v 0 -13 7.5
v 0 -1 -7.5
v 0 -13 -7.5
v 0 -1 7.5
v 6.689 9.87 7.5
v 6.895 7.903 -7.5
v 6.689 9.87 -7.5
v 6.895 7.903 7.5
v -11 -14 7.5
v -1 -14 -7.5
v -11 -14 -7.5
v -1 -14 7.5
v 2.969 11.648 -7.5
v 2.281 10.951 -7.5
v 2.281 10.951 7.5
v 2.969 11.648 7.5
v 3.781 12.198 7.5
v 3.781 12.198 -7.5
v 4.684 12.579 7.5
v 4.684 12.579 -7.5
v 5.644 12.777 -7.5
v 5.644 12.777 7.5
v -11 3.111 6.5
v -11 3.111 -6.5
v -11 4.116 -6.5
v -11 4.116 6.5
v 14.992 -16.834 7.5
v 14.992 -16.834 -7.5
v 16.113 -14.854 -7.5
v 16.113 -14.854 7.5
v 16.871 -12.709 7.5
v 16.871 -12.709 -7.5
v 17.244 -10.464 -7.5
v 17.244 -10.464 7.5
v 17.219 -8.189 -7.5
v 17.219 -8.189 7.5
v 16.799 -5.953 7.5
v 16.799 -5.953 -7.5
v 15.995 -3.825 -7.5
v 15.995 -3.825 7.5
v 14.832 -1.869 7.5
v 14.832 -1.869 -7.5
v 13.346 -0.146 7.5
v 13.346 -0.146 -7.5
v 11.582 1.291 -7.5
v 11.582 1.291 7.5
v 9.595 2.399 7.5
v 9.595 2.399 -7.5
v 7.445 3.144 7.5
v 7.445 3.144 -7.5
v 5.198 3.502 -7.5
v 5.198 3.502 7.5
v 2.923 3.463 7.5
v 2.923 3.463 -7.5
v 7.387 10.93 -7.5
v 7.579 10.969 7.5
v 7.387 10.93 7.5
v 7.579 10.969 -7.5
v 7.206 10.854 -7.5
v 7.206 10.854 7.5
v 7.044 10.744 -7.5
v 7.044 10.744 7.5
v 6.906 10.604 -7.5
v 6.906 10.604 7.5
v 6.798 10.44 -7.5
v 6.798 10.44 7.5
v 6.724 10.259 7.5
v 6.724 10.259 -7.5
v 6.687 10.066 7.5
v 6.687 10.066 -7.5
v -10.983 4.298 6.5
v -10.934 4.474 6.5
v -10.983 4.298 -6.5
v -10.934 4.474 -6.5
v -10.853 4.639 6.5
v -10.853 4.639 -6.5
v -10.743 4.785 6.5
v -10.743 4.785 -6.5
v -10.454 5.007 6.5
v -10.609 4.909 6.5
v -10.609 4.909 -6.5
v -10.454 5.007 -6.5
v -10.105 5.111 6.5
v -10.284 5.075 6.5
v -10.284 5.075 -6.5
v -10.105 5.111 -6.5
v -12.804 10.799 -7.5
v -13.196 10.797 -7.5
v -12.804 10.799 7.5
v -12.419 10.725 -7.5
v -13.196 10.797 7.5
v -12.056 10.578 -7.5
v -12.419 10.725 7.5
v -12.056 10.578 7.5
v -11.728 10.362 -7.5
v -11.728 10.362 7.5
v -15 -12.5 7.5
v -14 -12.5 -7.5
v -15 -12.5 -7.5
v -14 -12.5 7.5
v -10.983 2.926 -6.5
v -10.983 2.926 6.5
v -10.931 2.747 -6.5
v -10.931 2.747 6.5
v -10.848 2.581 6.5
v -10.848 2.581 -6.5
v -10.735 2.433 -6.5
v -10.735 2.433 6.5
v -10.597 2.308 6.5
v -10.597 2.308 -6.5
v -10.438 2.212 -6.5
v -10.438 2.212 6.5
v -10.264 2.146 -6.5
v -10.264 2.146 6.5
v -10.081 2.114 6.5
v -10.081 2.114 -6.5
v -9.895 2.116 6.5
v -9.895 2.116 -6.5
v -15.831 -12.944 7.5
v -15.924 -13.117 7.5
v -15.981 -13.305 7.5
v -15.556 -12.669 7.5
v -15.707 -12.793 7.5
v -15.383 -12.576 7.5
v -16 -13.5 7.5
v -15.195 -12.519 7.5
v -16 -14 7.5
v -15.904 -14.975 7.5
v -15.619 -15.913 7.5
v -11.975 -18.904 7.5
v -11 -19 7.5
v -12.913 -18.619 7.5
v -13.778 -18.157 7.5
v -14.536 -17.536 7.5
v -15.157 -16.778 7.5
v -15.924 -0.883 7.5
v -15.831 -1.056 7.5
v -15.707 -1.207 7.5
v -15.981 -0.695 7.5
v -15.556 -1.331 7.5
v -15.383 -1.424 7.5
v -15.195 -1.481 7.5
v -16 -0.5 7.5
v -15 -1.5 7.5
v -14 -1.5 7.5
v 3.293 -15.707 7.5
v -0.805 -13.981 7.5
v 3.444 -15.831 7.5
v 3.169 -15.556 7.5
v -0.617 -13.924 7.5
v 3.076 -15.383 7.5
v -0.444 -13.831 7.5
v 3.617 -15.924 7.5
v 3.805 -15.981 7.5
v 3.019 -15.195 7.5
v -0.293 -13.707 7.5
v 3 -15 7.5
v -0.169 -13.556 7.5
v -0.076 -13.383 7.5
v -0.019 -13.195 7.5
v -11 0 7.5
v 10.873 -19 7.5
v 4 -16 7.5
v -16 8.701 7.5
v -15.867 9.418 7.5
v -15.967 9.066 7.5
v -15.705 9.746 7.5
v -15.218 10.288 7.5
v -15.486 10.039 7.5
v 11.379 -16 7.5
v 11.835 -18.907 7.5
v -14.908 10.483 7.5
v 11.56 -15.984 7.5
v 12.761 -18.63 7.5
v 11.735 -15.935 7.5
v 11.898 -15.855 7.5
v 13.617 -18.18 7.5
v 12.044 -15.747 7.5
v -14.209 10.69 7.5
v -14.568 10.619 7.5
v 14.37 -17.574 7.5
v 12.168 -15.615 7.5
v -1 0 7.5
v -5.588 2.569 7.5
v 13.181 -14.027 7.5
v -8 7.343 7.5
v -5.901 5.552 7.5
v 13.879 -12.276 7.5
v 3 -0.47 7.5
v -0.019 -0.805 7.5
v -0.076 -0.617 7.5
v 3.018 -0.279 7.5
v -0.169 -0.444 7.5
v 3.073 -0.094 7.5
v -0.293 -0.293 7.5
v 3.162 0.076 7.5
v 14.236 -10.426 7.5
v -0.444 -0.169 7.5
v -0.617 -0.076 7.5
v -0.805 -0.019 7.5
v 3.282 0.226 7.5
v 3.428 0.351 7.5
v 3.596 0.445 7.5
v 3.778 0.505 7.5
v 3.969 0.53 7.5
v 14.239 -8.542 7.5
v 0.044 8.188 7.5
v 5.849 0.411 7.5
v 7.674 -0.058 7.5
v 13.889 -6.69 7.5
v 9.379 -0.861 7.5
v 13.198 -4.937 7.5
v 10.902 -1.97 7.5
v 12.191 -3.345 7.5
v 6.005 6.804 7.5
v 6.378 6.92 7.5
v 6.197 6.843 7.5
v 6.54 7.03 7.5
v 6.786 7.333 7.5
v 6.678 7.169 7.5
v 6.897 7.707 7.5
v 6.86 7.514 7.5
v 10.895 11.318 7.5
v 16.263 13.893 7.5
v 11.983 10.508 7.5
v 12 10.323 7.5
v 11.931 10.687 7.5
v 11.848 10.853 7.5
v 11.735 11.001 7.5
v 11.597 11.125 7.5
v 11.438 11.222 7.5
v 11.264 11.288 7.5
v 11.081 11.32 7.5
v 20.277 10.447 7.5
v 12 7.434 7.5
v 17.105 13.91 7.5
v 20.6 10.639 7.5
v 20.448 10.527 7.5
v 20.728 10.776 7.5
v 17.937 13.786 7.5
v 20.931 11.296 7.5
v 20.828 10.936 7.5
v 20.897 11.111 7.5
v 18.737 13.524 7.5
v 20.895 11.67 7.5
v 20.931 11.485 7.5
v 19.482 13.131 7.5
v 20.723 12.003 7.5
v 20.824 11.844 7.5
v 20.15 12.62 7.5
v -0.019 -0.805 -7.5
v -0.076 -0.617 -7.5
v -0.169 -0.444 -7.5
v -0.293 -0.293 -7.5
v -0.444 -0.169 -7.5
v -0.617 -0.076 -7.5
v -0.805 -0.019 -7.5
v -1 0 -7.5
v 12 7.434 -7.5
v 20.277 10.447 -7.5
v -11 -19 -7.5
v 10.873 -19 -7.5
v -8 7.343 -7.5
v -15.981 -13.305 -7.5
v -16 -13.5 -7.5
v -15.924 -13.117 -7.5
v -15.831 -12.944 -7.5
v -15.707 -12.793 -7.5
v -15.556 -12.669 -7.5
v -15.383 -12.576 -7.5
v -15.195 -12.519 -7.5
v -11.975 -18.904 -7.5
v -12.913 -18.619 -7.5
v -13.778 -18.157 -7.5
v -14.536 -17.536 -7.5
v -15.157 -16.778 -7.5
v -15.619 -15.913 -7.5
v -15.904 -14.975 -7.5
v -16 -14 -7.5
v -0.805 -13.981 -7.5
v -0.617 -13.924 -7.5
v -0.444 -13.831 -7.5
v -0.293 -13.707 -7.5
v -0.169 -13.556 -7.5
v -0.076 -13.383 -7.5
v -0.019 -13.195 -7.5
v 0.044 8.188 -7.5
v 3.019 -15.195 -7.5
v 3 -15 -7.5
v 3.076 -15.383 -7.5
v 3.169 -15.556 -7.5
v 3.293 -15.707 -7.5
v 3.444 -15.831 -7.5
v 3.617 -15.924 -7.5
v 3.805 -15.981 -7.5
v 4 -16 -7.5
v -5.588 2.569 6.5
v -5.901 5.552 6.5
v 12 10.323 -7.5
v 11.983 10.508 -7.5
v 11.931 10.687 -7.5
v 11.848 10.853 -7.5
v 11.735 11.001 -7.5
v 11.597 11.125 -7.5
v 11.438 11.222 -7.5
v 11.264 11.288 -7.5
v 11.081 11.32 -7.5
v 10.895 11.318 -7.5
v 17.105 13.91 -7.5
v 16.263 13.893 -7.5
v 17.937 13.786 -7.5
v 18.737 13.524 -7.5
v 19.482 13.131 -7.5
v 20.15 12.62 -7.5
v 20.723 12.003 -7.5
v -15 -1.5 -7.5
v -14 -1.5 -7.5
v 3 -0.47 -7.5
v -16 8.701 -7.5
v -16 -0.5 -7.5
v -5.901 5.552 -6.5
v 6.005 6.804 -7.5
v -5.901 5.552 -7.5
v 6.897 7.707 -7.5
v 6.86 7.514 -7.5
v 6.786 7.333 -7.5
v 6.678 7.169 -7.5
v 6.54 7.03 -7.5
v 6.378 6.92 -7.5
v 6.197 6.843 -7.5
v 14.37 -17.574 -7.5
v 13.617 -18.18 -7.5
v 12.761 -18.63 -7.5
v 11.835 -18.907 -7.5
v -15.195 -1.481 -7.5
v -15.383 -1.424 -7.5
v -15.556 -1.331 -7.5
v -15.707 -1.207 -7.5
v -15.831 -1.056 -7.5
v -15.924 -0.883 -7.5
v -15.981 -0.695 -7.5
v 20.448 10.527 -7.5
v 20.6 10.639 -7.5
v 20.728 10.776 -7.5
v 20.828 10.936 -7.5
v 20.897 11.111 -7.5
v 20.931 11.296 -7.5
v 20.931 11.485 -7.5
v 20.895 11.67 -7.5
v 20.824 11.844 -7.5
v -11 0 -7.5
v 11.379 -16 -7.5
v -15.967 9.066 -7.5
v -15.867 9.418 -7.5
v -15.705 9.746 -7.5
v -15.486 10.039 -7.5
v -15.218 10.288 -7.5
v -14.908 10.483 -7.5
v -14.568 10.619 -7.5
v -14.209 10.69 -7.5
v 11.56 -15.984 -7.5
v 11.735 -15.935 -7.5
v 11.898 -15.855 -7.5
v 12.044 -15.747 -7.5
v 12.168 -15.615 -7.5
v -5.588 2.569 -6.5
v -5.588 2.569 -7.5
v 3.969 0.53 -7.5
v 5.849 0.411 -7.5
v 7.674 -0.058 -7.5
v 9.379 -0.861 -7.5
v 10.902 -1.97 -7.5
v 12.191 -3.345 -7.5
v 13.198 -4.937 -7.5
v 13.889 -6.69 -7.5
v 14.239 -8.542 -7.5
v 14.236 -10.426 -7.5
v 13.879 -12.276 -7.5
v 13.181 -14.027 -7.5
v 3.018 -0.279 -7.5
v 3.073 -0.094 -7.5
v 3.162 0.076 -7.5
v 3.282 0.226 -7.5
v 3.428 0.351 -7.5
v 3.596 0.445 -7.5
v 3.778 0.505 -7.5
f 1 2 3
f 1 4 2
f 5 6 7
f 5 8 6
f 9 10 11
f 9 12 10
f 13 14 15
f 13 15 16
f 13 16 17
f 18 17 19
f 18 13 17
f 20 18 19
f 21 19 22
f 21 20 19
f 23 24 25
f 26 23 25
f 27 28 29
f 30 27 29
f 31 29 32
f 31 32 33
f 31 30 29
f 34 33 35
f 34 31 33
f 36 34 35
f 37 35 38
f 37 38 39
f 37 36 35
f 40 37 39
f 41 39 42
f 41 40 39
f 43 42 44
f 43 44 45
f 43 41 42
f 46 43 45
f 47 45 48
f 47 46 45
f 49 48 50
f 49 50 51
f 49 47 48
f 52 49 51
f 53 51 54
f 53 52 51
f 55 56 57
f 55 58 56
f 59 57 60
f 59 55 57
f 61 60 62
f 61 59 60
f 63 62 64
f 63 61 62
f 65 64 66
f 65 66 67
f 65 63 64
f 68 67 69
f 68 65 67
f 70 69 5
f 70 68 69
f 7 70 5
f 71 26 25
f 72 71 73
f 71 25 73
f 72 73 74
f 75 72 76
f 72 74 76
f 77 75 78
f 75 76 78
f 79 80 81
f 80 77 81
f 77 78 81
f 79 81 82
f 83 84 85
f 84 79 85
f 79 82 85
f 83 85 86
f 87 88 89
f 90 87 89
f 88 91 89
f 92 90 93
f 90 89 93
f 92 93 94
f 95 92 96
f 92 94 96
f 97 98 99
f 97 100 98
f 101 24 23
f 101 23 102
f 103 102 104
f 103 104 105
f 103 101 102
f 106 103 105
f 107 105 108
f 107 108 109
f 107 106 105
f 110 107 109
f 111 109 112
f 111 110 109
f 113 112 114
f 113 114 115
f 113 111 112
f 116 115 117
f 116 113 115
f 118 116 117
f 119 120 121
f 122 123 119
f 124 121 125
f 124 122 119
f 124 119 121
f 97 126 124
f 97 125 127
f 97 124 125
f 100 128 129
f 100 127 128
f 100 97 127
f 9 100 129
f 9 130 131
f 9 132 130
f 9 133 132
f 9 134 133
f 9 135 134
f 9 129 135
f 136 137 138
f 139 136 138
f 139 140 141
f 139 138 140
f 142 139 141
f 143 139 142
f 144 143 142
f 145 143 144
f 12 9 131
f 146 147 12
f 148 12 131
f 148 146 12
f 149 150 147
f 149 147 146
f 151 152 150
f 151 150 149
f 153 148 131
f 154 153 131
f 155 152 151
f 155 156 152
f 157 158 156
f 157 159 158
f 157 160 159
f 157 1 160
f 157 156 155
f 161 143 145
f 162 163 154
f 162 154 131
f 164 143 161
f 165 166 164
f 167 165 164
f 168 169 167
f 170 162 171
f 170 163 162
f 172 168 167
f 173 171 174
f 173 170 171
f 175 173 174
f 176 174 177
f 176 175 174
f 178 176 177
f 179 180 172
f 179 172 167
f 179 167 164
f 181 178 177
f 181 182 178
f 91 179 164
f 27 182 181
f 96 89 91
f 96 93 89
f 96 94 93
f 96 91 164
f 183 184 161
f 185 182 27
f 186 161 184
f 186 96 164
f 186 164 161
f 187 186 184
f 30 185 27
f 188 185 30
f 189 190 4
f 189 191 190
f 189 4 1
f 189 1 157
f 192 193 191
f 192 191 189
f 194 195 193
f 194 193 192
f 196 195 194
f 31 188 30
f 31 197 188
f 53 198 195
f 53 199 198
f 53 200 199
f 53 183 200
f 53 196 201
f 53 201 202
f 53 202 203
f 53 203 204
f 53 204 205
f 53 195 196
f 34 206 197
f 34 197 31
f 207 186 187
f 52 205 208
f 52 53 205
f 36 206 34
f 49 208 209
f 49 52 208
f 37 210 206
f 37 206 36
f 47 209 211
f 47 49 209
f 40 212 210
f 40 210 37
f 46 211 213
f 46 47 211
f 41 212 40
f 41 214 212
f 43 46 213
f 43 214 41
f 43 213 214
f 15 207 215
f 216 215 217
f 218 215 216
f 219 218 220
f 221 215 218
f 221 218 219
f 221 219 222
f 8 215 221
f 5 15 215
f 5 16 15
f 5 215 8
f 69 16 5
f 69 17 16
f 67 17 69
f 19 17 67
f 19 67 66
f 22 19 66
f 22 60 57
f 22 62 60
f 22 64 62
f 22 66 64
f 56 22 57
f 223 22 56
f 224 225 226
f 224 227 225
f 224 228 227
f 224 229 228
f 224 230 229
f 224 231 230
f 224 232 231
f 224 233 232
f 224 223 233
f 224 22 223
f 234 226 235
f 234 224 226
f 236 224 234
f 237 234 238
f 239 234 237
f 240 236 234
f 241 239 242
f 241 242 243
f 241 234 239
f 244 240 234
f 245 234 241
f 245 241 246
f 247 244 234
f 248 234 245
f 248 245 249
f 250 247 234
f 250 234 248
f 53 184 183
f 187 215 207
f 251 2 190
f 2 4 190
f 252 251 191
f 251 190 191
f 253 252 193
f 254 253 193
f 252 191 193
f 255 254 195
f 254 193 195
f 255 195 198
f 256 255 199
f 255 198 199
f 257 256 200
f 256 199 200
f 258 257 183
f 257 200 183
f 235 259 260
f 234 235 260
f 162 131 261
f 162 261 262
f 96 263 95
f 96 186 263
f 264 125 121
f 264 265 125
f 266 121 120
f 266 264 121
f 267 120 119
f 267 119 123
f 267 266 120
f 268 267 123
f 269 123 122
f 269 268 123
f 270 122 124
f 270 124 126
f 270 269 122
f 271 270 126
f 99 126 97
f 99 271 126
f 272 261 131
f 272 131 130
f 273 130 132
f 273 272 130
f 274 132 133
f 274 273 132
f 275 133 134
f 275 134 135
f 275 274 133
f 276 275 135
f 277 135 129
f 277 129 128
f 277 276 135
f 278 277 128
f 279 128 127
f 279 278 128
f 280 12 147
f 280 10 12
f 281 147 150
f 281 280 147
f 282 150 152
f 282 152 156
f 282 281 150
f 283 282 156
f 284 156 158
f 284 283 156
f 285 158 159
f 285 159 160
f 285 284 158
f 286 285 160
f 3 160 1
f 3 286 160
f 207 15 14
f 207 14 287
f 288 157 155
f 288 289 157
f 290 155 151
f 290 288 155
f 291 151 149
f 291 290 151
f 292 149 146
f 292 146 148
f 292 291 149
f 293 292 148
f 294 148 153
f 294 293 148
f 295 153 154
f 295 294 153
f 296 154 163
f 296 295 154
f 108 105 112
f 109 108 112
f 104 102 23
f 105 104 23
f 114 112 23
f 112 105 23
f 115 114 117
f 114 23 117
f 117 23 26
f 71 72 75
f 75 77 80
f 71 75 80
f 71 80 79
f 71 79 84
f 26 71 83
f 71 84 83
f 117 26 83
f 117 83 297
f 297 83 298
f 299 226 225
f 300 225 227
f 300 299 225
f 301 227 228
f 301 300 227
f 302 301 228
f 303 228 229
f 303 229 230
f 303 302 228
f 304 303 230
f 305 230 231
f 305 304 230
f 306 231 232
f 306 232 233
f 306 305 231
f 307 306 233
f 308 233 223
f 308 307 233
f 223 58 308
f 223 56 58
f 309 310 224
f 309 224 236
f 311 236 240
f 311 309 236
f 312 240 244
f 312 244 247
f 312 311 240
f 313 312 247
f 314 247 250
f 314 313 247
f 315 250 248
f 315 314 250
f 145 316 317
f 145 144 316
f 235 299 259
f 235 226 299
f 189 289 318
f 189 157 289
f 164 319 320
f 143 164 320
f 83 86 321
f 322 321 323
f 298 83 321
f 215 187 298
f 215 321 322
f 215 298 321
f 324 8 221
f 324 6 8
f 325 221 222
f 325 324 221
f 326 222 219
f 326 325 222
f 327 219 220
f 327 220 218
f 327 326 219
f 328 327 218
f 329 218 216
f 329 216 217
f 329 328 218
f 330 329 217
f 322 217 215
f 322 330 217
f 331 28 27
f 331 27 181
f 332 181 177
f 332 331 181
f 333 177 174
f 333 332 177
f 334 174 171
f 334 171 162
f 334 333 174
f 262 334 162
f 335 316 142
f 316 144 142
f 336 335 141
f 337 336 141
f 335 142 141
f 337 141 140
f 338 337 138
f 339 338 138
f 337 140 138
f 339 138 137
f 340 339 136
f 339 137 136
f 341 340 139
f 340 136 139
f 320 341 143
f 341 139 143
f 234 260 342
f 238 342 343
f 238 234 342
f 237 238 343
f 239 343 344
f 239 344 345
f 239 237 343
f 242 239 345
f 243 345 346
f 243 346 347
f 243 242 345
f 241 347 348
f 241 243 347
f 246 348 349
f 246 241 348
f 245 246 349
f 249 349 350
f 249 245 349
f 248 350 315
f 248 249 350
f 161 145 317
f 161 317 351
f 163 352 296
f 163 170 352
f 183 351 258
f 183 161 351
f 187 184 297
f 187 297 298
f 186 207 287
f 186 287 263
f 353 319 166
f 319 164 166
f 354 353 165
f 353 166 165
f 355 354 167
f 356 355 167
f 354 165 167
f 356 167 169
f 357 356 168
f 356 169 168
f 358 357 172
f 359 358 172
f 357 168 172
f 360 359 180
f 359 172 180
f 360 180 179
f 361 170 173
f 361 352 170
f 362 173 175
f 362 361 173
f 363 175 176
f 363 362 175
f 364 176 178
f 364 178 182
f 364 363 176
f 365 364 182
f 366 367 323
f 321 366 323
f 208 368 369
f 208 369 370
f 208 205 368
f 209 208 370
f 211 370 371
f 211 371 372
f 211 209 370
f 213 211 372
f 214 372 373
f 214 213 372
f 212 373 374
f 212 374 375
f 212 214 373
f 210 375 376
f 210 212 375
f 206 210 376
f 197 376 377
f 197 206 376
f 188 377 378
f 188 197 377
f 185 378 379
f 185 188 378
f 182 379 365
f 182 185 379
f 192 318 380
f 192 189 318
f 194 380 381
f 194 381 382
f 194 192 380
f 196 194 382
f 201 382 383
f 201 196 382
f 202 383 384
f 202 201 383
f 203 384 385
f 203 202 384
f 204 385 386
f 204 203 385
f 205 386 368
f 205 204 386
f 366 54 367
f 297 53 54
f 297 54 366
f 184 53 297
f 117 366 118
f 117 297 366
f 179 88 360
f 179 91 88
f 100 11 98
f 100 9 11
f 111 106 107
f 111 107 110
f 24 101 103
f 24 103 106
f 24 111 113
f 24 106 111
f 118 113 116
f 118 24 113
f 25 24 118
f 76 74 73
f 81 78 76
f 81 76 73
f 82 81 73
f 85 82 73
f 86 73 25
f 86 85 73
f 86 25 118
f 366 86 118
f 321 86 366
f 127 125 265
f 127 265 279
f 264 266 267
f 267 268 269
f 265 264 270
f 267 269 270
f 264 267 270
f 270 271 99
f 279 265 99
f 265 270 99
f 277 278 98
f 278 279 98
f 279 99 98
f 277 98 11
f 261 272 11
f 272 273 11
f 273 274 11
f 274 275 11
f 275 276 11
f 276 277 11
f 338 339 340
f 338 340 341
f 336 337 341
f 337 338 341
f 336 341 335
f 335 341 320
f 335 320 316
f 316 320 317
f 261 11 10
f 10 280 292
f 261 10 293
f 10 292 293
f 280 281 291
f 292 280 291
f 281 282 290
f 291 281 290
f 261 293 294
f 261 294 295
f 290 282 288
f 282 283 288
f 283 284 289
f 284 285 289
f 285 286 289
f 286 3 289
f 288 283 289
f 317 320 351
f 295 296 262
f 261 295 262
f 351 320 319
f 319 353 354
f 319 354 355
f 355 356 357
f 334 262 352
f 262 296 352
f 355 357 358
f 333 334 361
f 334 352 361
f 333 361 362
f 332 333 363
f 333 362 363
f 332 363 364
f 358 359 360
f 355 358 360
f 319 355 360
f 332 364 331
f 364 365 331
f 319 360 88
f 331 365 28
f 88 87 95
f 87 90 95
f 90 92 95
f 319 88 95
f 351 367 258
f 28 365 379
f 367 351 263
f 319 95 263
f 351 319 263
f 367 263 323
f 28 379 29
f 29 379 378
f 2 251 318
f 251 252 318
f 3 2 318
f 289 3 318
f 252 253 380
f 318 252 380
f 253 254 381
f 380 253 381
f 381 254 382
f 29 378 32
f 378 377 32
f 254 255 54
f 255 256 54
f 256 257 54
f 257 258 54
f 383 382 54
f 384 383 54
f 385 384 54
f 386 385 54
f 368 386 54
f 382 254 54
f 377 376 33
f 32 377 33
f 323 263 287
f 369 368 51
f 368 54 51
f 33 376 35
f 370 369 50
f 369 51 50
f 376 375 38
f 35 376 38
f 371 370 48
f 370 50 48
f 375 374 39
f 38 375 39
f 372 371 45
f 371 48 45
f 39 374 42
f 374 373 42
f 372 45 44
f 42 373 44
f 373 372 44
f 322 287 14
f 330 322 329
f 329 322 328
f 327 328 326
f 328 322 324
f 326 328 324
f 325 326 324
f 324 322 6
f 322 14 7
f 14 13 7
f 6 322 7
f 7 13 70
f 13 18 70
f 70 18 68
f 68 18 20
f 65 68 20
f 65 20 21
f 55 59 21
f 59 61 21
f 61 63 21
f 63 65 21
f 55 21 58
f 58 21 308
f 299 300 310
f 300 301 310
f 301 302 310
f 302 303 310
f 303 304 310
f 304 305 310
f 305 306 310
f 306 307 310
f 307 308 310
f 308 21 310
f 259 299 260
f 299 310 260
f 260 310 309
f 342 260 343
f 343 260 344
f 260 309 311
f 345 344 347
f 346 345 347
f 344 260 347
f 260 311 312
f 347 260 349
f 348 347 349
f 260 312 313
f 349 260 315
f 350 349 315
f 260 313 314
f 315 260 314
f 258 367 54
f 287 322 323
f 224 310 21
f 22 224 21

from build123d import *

# Parameters (mm, degrees)
F1_DEPTH    = 7.5
F2_T1_DEPTH = 40.8093190584
F2_T3_DEPTH = 25.3553390593
F2_T5_DEPTH = 40
F2_T7_DEPTH = 29.3169174454
F3_R        = 1
F5_DEPTH    = 1
F7_R        = 2


# Not quite as in the source:
# - a fillet or chamfer that OpenCascade refuses, or shapes differently, is made with other operations: its cross-section is extruded or revolved along the edge and cut away or added


with BuildPart() as f1:
    # F0 (on Top) → F1 (new body, symmetric)
    with BuildSketch(Plane.XY):
        with BuildLine():
            Line((12, 11.4339222498), (12, 7.4339222498))
            Line((12, 7.4339222498), (21.3969262079, 10.8541236831))
            Line((21.3969262079, 10.8541236831), (21.3969262079, 14.4325955519))
            Line((21.3969262079, 14.4325955519), (3.5841766184, 12.5604001283))
            Line((3.5841766184, 12.5604001283), (0.0437047985, 8.1882815452))
            Line((0.0437047985, 8.1882815452), (-8, 7.3428541036))
            Line((-8, 7.3428541036), (-12.3721185831, 10.8833259234))
            Line((-12.3721185831, 10.8833259234), (-16, 10.5020202215))
            Line((-16, 10.5020202215), (-16, -1.5))
            Line((-16, -1.5), (-14, -1.5))
            Line((-14, -1.5), (-11, 0))
            Line((-11, 0), (0, 0))
            Line((0, 0), (0, -14))
            Line((0, -14), (-11, -14))
            Line((-11, -14), (-14, -12.5))
            Line((-14, -12.5), (-16, -12.5))
            Line((-16, -12.5), (-16, -19))
            Line((-16, -19), (13.1190956366, -19))
            ThreePointArc((13.1190956366, -19), (16.1198863152, -4.0924328046), (2.9233065352, 3.4633984857))
            Line((2.9233065352, 3.4633984857), (-11, 2))
            Line((-11, 2), (-11, 5.0165248387))
            Line((-11, 5.0165248387), (7, 6.9084010735))
            Line((7, 6.9084010735), (6.5841766184, 10.8646962749))
            Line((6.5841766184, 10.8646962749), (12, 11.4339222498))
        make_face()
        with BuildLine():
            ThreePointArc((3, 0.4520743715), (13.0884587778, -4.7273070645), (11.8517750862, -16))
            Line((11.8517750862, -16), (3, -16))
            Line((3, -16), (3, 0.4520743715))
        make_face(mode=Mode.SUBTRACT)
    extrude(amount=F1_DEPTH, both=True)

    # F2: fillet of radius 5 on 4 edges, made by hand

    # F2_s2 → F2_t1 (cut)
    with BuildSketch(Plane.XY.offset(-20.4046595292)):
        with BuildLine():
            ThreePointArc((16.2633396262, 13.89303386), (19.3329992123, 13.2230634603), (21.3969262079, 10.8541236831))
            Line((21.3969262079, 10.8541236831), (21.3969262079, 14.4325955519))
            Line((21.3969262079, 14.4325955519), (16.2633396262, 13.89303386))
        make_face()
    extrude(amount=F2_T1_DEPTH, mode=Mode.SUBTRACT)

    # F2_s4 → F2_t3 (cut)
    with BuildSketch(Plane.XY.offset(-12.6776695297)):
        with BuildLine():
            ThreePointArc((2.2808114131, 10.9508781424), (3.7807474191, 12.1983617504), (5.6438989041, 12.776885664))
            Line((5.6438989041, 12.776885664), (3.5841766184, 12.5604001283))
            Line((3.5841766184, 12.5604001283), (2.2808114131, 10.9508781424))
        make_face()
    extrude(amount=F2_T3_DEPTH, mode=Mode.SUBTRACT)

    # F2_s6 → F2_t5 (cut)
    with BuildSketch(Plane.XY.offset(-20)):
        with BuildLine():
            ThreePointArc((-11, -19), (-14.5355339059, -17.5355339059), (-16, -14))
            Line((-16, -14), (-16, -19))
            Line((-16, -19), (-11, -19))
        make_face()
    extrude(amount=F2_T5_DEPTH, mode=Mode.SUBTRACT)

    # F2_s8 → F2_t7 (cut)
    with BuildSketch(Plane.XY.offset(-14.6584587227)):
        with BuildLine():
            ThreePointArc((14.9920579896, -16.8341336537), (13.1998162834, -18.4255320736), (10.8728728234, -19))
            Line((10.8728728234, -19), (13.1190956366, -19))
            ThreePointArc((13.1190956366, -19), (14.115390519, -17.9687915418), (14.9920579896, -16.8341336537))
        make_face()
    extrude(amount=F2_T7_DEPTH, mode=Mode.SUBTRACT)

    # F3
    f3_edges = [f1.edges().sort_by_distance(p)[0] for p in [
        (21.396926, 10.854124, 0),
        (7, 6.908401, 0),
        (-11, 5.016525, 0),
        (-11, 2, 0),
        (12, 11.433922, 0),
        (6.584177, 10.864696, 0),
        (0, 0, 0),
        (0, -14, 0),
        (11.851775, -16, 0),
        (3, -16, 0),
        (3, 0.452074, 0),
        (-16, -12.5, 0),
        (-16, -1.5, 0),
    ]]
    fillet(f3_edges, radius=F3_R)

    # F4 (on face) → F5 (join)
    with BuildSketch(Plane.XY.offset(7.5)):
        with BuildLine():
            Line((-5.9013941166, 5.552409911), (-10.1045284633, 5.1106426898))
            ThreePointArc((-10.1045284633, 5.1106426898), (-10.7431448255, 4.7852514008), (-11, 4.1161207944))
            Line((-11, 4.1161207944), (-11, 3.1106125148))
            ThreePointArc((-11, 3.1106125148), (-10.6691306064, 2.3674676894), (-9.8954715367, 2.1160906195))
            Line((-9.8954715367, 2.1160906195), (-5.5878087268, 2.5688442249))
            Line((-5.5878087268, 2.5688442249), (-5.9013941166, 5.552409911))
        make_face()
    extrude(amount=-F5_DEPTH)

    # F6: F1 across plane


with BuildPart() as f1_1:
    add(f1.part)
    add(f1.part.mirror(Plane.XY))

    # F7
    f7_edges = [f1_1.edges().sort_by_distance(p)[0] for p in [
        (-12.372119, 10.883326, 0),
        (-16, 10.50202, 0),
    ]]
    fillet(f7_edges, radius=F7_R)


solid = f1_1.part
